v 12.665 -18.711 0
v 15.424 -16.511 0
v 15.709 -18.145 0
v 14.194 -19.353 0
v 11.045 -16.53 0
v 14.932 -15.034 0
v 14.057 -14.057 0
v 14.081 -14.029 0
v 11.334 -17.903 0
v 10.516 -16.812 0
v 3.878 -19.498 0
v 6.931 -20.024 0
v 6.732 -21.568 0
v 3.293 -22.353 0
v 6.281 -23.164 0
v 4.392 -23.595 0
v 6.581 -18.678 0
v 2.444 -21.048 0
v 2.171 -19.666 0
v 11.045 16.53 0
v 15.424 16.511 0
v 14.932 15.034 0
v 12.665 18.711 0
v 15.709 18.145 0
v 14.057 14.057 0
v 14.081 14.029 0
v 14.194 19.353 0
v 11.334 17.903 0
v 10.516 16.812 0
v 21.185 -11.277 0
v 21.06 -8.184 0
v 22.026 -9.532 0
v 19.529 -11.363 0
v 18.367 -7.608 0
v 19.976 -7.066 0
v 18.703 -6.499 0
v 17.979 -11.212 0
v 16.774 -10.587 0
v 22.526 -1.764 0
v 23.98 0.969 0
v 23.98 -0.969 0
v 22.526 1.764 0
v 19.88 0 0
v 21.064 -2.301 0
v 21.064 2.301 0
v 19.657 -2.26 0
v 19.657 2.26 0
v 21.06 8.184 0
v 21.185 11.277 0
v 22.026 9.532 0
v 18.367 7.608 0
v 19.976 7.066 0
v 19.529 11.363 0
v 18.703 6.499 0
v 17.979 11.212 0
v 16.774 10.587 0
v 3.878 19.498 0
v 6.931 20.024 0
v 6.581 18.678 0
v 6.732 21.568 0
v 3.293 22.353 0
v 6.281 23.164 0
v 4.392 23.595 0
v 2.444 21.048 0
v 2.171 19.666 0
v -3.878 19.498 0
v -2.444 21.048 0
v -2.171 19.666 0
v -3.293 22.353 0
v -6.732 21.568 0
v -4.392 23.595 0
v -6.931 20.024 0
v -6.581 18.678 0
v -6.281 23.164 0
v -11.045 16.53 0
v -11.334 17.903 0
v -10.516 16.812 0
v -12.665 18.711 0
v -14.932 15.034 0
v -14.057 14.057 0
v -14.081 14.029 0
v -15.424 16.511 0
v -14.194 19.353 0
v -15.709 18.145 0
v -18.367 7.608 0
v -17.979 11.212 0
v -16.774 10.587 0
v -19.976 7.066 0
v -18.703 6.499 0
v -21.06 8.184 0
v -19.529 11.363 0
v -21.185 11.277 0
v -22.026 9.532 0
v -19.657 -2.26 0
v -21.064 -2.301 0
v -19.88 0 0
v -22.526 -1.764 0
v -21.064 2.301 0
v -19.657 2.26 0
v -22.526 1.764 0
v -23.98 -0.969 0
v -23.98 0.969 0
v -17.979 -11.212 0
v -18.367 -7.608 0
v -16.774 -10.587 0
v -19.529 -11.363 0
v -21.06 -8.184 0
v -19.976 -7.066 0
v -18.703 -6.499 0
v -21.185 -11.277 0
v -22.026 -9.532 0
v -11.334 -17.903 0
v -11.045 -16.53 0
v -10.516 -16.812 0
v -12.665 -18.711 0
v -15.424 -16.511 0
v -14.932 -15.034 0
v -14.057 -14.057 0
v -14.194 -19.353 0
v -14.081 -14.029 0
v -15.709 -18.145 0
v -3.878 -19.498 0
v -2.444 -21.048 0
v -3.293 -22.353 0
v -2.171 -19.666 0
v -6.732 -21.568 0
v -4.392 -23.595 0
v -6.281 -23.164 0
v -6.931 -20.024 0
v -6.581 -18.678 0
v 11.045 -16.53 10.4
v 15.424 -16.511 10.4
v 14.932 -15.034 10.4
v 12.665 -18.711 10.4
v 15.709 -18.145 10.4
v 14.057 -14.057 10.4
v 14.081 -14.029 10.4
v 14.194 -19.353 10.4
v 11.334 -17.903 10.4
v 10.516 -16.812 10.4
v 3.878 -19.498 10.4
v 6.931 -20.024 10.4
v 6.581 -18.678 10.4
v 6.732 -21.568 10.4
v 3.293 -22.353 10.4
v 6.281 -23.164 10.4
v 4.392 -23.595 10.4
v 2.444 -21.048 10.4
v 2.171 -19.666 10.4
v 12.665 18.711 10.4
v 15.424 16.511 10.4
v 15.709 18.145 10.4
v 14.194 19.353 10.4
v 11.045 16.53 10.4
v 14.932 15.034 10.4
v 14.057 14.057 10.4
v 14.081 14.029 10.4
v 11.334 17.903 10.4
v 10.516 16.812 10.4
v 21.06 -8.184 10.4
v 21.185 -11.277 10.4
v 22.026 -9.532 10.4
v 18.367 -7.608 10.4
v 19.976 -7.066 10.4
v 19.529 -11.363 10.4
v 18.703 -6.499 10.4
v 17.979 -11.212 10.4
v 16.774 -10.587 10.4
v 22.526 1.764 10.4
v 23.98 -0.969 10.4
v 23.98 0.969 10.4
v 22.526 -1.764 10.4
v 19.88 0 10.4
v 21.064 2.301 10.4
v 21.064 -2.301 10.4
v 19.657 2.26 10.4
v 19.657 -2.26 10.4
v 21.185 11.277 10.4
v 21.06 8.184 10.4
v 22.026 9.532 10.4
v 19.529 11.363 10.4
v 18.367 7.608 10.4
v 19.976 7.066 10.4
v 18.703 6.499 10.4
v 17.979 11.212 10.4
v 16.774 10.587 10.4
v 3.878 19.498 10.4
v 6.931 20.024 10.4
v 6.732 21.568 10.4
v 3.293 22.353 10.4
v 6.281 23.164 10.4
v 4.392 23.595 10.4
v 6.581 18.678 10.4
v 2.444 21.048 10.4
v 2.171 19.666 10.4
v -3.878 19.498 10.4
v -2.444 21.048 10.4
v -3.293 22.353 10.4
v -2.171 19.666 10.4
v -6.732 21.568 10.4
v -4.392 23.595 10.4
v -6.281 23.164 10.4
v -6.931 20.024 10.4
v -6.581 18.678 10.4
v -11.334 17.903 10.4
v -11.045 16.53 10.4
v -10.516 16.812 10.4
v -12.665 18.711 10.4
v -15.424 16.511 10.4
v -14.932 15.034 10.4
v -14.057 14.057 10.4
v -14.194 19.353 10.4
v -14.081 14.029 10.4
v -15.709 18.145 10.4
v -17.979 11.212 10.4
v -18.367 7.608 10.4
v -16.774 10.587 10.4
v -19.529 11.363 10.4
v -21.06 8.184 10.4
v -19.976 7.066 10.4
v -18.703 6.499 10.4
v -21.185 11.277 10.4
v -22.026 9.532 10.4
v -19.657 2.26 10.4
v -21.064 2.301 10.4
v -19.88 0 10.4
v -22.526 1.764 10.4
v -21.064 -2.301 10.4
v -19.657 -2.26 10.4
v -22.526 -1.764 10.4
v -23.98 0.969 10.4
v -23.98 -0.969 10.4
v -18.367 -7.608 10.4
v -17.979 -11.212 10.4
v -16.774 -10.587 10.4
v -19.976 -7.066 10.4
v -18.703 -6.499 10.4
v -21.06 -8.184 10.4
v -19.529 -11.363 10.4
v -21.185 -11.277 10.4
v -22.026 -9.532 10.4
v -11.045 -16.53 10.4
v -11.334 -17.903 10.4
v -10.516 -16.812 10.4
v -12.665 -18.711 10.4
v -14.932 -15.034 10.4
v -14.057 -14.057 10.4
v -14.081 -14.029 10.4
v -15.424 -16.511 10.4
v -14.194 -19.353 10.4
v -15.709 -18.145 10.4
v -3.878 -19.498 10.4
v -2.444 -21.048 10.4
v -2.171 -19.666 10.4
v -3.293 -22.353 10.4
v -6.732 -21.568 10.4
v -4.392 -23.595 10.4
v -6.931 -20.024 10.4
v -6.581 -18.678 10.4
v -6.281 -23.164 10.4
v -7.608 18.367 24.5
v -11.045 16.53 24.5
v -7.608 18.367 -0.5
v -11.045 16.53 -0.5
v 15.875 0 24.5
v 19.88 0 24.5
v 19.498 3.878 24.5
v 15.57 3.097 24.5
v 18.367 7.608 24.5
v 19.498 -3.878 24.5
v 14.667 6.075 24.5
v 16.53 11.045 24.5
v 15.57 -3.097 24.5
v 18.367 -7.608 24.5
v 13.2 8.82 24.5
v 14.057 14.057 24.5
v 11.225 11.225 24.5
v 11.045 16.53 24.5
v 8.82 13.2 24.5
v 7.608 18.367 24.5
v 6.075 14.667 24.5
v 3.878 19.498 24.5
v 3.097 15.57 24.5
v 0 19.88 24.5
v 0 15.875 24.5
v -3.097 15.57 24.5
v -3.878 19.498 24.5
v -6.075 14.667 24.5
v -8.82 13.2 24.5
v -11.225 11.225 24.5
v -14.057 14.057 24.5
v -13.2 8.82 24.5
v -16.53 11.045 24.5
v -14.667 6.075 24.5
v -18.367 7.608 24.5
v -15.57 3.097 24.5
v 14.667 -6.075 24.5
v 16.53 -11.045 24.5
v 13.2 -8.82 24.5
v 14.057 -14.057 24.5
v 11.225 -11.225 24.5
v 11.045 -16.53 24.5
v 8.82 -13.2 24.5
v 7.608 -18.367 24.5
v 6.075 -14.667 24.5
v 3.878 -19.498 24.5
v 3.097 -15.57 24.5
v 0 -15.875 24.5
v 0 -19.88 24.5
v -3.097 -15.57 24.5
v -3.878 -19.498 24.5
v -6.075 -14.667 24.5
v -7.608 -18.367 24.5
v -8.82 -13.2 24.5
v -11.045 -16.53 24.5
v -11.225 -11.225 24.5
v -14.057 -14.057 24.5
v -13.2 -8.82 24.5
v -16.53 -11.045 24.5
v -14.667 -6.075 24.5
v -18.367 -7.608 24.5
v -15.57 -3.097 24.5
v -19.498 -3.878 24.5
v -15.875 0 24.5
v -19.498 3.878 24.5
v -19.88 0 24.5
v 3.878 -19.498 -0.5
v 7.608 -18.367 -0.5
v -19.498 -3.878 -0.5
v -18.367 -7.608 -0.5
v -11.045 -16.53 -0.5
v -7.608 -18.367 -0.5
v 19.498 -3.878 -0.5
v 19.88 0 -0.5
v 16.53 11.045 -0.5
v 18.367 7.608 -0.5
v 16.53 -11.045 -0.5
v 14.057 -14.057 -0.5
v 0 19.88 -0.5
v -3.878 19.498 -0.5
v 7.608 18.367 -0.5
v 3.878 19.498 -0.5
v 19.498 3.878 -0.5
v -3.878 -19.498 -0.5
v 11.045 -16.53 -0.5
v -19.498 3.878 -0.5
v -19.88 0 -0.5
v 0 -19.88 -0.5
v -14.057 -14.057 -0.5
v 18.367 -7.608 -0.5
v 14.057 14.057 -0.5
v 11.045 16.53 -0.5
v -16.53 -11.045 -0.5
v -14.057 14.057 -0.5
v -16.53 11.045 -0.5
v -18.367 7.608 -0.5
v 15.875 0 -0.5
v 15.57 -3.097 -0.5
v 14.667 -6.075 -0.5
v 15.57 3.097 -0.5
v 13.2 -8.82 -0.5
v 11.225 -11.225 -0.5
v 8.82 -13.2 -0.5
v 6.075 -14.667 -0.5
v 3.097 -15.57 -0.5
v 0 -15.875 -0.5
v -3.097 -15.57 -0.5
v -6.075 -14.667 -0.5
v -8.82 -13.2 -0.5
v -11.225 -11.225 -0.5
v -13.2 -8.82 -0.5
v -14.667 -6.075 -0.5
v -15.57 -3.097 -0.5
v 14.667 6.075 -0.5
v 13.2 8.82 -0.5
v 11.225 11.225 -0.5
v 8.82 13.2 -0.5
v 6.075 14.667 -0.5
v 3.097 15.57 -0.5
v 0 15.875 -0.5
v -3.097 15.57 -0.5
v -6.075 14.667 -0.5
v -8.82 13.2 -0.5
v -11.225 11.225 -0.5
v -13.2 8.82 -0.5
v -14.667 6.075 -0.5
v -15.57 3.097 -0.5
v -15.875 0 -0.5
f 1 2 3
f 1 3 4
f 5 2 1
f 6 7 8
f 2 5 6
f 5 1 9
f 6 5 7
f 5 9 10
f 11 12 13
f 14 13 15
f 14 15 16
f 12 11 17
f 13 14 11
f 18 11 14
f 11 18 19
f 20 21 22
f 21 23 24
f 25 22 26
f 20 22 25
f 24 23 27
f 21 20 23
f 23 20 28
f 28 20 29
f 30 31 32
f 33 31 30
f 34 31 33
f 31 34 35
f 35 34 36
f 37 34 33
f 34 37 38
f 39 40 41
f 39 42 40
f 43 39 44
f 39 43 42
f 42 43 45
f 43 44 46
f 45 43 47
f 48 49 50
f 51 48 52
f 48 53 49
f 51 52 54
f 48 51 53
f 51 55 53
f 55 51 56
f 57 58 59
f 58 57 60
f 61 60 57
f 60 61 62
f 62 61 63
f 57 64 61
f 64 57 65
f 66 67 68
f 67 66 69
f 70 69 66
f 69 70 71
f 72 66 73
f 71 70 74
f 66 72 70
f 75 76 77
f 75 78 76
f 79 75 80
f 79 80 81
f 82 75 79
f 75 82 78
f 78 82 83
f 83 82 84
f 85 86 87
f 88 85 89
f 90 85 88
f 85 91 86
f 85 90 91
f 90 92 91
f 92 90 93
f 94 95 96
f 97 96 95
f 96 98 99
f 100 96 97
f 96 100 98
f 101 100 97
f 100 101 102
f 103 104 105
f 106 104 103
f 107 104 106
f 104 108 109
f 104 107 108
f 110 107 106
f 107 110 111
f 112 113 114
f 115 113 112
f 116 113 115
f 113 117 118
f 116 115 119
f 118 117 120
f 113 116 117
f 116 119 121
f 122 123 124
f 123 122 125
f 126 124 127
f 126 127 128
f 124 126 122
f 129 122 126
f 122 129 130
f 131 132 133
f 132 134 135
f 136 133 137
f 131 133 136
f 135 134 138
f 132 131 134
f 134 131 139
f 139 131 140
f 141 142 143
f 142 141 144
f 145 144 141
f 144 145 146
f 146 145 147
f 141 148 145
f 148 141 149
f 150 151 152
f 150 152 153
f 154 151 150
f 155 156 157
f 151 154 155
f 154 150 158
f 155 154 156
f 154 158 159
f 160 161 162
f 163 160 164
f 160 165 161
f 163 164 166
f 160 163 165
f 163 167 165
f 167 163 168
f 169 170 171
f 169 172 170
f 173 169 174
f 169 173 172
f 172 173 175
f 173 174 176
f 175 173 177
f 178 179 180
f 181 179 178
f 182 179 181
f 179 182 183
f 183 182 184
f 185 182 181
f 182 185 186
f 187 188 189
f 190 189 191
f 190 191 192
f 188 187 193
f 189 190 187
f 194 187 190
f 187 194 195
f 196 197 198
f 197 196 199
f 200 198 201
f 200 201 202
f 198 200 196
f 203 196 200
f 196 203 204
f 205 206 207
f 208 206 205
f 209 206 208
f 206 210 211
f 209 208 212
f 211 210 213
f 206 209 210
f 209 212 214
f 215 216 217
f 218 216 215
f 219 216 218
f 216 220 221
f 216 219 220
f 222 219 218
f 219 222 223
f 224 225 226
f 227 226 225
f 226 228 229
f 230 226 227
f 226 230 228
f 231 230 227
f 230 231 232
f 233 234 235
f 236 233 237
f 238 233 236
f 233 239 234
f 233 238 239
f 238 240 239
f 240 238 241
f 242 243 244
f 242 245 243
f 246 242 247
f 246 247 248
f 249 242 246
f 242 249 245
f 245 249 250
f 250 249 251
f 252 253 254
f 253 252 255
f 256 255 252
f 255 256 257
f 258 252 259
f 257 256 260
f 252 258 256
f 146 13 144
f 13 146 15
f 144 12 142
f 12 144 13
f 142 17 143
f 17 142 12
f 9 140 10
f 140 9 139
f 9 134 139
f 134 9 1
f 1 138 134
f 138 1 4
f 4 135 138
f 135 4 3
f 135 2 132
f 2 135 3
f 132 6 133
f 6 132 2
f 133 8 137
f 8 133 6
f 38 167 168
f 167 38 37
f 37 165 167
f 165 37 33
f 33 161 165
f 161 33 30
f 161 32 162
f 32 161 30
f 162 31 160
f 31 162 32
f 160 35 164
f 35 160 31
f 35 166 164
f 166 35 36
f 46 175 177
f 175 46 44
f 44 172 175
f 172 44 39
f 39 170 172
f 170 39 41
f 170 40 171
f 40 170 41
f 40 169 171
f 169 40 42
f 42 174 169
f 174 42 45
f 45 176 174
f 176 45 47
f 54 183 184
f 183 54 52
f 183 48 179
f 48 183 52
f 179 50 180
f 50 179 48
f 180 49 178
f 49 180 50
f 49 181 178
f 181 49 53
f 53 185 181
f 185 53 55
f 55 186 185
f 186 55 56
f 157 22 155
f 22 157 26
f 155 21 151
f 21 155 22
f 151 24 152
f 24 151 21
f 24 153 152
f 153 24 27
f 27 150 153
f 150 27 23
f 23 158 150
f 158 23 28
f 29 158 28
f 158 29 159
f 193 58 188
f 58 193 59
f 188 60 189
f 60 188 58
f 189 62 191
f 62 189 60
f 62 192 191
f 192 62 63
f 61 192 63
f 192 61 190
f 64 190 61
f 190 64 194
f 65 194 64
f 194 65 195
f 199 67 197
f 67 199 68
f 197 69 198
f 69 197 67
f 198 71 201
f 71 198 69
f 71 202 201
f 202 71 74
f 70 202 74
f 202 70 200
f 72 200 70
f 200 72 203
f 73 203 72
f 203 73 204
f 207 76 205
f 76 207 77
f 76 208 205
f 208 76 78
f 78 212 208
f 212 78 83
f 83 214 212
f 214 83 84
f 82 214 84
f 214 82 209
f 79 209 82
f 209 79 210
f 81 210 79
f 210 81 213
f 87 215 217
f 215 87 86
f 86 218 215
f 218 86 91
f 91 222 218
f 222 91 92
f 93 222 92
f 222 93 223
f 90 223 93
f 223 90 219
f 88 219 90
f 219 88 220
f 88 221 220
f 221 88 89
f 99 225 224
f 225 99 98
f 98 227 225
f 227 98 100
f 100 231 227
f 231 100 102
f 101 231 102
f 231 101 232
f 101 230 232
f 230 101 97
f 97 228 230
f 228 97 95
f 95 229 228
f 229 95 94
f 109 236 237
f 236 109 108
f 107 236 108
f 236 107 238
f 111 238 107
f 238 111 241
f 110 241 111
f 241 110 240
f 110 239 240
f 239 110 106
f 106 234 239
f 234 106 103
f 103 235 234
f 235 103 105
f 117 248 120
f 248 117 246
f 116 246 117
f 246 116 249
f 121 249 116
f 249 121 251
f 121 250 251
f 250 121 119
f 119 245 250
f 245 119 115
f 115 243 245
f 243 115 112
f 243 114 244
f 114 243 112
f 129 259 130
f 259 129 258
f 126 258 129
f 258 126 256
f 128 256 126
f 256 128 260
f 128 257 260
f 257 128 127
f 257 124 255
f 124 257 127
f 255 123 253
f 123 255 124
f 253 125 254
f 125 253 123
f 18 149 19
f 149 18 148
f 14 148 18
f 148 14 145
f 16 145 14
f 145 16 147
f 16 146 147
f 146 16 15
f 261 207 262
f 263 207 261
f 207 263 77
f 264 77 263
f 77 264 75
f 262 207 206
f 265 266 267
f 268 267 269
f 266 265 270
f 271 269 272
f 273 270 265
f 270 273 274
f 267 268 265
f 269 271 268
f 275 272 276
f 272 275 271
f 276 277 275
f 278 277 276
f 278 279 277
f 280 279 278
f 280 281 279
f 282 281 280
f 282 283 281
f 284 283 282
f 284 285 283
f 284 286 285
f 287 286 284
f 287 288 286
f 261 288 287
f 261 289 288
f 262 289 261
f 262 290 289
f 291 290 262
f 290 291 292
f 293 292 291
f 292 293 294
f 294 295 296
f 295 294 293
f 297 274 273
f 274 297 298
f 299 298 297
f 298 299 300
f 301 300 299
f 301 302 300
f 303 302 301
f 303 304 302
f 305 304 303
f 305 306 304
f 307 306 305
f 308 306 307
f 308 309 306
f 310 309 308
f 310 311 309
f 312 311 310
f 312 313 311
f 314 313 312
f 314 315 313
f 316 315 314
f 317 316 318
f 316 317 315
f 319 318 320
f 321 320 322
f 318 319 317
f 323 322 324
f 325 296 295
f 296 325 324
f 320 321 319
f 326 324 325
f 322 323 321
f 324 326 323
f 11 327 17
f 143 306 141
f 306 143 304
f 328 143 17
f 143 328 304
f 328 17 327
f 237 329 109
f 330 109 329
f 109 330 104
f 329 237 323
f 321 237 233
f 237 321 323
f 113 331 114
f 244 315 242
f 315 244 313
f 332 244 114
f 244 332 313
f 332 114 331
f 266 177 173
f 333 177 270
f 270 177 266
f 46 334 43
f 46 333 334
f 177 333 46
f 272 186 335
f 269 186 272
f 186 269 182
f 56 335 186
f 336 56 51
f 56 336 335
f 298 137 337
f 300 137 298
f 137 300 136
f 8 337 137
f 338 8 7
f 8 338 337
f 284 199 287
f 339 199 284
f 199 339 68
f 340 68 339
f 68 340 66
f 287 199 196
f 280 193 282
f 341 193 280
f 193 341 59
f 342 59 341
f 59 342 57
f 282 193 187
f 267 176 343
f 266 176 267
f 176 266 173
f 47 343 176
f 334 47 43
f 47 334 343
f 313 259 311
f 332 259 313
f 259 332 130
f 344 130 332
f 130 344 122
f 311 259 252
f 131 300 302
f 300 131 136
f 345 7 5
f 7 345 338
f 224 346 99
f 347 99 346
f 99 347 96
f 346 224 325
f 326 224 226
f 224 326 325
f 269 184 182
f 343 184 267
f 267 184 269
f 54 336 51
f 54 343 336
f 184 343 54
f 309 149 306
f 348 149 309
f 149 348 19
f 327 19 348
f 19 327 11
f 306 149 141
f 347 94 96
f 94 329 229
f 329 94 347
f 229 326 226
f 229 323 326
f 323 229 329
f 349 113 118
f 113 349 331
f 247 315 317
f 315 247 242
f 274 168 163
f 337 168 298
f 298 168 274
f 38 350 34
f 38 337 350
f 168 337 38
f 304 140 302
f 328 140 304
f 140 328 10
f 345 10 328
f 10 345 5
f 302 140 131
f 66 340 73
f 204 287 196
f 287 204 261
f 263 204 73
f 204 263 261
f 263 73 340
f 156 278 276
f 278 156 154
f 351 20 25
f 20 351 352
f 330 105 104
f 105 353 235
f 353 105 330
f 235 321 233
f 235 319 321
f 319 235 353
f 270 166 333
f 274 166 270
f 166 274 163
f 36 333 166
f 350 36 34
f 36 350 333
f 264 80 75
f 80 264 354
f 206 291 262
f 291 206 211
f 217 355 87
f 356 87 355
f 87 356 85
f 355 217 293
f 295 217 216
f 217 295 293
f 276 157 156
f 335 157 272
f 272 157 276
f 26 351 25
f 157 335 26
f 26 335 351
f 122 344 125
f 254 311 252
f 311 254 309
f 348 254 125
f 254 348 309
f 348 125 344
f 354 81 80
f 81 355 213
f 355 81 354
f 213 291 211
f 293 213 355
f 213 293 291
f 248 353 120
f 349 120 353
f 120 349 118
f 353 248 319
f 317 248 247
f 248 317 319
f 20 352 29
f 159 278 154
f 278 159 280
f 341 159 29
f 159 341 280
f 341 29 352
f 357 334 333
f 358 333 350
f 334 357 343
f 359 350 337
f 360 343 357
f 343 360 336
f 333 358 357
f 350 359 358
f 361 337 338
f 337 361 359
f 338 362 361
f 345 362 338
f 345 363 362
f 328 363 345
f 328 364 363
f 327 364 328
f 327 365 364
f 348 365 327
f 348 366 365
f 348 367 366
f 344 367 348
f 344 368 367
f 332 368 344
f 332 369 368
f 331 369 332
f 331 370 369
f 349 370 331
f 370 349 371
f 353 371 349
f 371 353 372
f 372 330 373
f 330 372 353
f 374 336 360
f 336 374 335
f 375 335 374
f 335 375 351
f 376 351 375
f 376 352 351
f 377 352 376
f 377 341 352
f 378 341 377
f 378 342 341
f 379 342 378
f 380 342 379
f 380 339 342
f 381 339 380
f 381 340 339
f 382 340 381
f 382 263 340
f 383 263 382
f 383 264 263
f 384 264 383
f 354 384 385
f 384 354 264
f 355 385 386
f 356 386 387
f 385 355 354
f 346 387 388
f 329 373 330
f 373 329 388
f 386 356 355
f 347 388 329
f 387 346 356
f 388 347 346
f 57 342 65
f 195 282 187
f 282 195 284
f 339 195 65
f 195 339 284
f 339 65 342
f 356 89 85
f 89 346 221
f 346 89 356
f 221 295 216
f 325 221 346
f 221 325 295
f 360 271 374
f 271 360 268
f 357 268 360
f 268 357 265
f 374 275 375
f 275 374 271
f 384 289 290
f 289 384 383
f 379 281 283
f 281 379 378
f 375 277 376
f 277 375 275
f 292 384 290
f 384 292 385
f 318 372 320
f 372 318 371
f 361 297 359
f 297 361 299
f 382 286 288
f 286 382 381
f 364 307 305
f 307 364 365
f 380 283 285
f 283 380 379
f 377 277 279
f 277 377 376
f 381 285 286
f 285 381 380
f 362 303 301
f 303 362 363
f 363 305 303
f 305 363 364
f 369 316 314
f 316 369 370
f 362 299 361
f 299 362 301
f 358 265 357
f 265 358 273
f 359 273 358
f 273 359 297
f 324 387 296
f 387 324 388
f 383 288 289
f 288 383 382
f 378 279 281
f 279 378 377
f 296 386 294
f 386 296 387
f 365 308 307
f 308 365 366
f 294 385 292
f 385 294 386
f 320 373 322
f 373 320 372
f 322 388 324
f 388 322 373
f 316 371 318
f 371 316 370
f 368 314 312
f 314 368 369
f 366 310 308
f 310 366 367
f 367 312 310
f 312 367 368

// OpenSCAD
$fn = 32;

// ----------------------------------------------------------------------
// Two-module gear rim: z14 m3 and z18 m1.8, 24 mm wide
// ----------------------------------------------------------------------

// --- parameters (mm) ---
module_a = 3;             // first tooth module
teeth_a = 14;             // first band tooth count
module_b = 1.8;           // second tooth module
teeth_b = 18;             // second band tooth count
band_h = 10;              // height of one tooth band
web_t = 4;                // web thickness between the bands
total = 24;               // overall width over both bands
root_r = 17.25;           // root radius of the coarse band
hub_r = 19.88;            // hub radius
bore_d = 31.75;           // hub bore
hole_count = 5;           // lightening holes
hole_r = 13.12;           // lightening hole circle radius
hole_d = 4;               // lightening hole diameter

band_a = [[17.111, -2.185], [21.064, -2.301], [22.526, -1.764], [23.98, -0.969], [23.98, 0.969], [22.526, 1.764], [21.064, 2.301], [17.111, 2.185], [16.364, 5.456], [19.976, 7.066], [21.06, 8.184], [22.026, 9.532], [21.185, 11.277], [19.529, 11.363], [17.979, 11.212], [14.469, 9.392], [12.377, 12.016], [14.932, 15.034], [15.424, 16.511], [15.709, 18.145], [14.194, 19.353], [12.665, 18.711], [11.334, 17.903], [8.961, 14.74], [5.937, 16.196], [6.931, 20.024], [6.732, 21.568], [6.281, 23.164], [4.392, 23.595], [3.293, 22.353], [2.444, 21.048], [1.678, 17.168], [-1.678, 17.168], [-2.444, 21.048], [-3.293, 22.353], [-4.392, 23.595], [-6.281, 23.164], [-6.732, 21.568], [-6.931, 20.024], [-5.937, 16.196], [-8.961, 14.74], [-11.334, 17.903], [-12.665, 18.711], [-14.194, 19.353], [-15.709, 18.145], [-15.424, 16.511], [-14.932, 15.034], [-12.377, 12.016], [-14.469, 9.392], [-17.979, 11.212], [-19.529, 11.363], [-21.185, 11.277], [-22.026, 9.532], [-21.06, 8.184], [-19.976, 7.066], [-16.364, 5.456], [-17.111, 2.185], [-21.064, 2.301], [-22.526, 1.764], [-23.98, 0.969], [-23.98, -0.969], [-22.526, -1.764], [-21.064, -2.301], [-17.111, -2.185], [-16.364, -5.456], [-19.976, -7.066], [-21.06, -8.184], [-22.026, -9.532], [-21.185, -11.277], [-19.529, -11.363], [-17.979, -11.212], [-14.469, -9.392], [-12.377, -12.016], [-14.932, -15.034], [-15.424, -16.511], [-15.709, -18.145], [-14.194, -19.353], [-12.665, -18.711], [-11.334, -17.903], [-8.961, -14.74], [-5.937, -16.196], [-6.931, -20.024], [-6.732, -21.568], [-6.281, -23.164], [-4.392, -23.595], [-3.293, -22.353], [-2.444, -21.048], [-1.678, -17.168], [1.678, -17.168], [2.444, -21.048], [3.293, -22.353], [4.392, -23.595], [6.281, -23.164], [6.732, -21.568], [6.931, -20.024], [5.937, -16.196], [8.961, -14.74], [11.334, -17.903], [12.665, -18.711], [14.194, -19.353], [15.709, -18.145], [15.424, -16.511], [14.932, -15.034], [12.377, -12.016], [14.469, -9.392], [17.979, -11.212], [19.529, -11.363], [21.185, -11.277], [22.026, -9.532], [21.06, -8.184], [19.976, -7.066], [16.364, -5.456]];
band_b = [[13.878, -1.42], [16.12, -1.417], [17.056, -1.088], [17.99, -0.613], [17.99, 0.613], [17.056, 1.088], [16.12, 1.417], [13.878, 1.42], [13.526, 3.412], [15.632, 4.182], [16.4, 4.811], [17.114, 5.576], [16.695, 6.729], [15.656, 6.856], [14.663, 6.845], [12.555, 6.081], [11.544, 7.832], [13.259, 9.276], [13.765, 10.13], [14.175, 11.094], [13.387, 12.033], [12.366, 11.797], [11.438, 11.447], [9.718, 10.008], [8.169, 11.308], [9.287, 13.252], [9.471, 14.227], [9.526, 15.273], [8.464, 15.886], [7.586, 15.315], [6.833, 14.669], [5.709, 12.728], [3.809, 13.42], [4.195, 15.629], [4.033, 16.608], [3.728, 17.61], [2.52, 17.823], [1.89, 16.986], [1.404, 16.121], [1.011, 13.913], [-1.011, 13.913], [-1.404, 16.121], [-1.89, 16.986], [-2.52, 17.823], [-3.728, 17.61], [-4.033, 16.608], [-4.195, 15.629], [-3.809, 13.42], [-5.709, 12.728], [-6.833, 14.669], [-7.586, 15.315], [-8.464, 15.886], [-9.526, 15.273], [-9.471, 14.227], [-9.287, 13.252], [-8.169, 11.308], [-9.718, 10.008], [-11.438, 11.447], [-12.366, 11.797], [-13.387, 12.033], [-14.175, 11.094], [-13.765, 10.13], [-13.259, 9.276], [-11.544, 7.832], [-12.555, 6.081], [-14.663, 6.845], [-15.656, 6.856], [-16.695, 6.729], [-17.114, 5.576], [-16.4, 4.811], [-15.632, 4.182], [-13.526, 3.412], [-13.878, 1.42], [-16.12, 1.417], [-17.056, 1.088], [-17.99, 0.613], [-17.99, -0.613], [-17.056, -1.088], [-16.12, -1.417], [-13.878, -1.42], [-13.526, -3.412], [-15.632, -4.182], [-16.4, -4.811], [-17.114, -5.576], [-16.695, -6.729], [-15.656, -6.856], [-14.663, -6.845], [-12.555, -6.081], [-11.544, -7.832], [-13.259, -9.276], [-13.765, -10.13], [-14.175, -11.094], [-13.387, -12.033], [-12.366, -11.797], [-11.438, -11.447], [-9.718, -10.008], [-8.169, -11.308], [-9.287, -13.252], [-9.471, -14.227], [-9.526, -15.273], [-8.464, -15.886], [-7.586, -15.315], [-6.833, -14.669], [-5.709, -12.728], [-3.809, -13.42], [-4.195, -15.629], [-4.033, -16.608], [-3.728, -17.61], [-2.52, -17.823], [-1.89, -16.986], [-1.404, -16.121], [-1.011, -13.913], [1.011, -13.913], [1.404, -16.121], [1.89, -16.986], [2.52, -17.823], [3.728, -17.61], [4.033, -16.608], [4.195, -15.629], [3.809, -13.42], [5.709, -12.728], [6.833, -14.669], [7.586, -15.315], [8.464, -15.886], [9.526, -15.273], [9.471, -14.227], [9.287, -13.252], [8.169, -11.308], [9.718, -10.008], [11.438, -11.447], [12.366, -11.797], [13.387, -12.033], [14.175, -11.094], [13.765, -10.13], [13.259, -9.276], [11.544, -7.832], [12.555, -6.081], [14.663, -6.845], [15.656, -6.856], [16.695, -6.729], [17.114, -5.576], [16.4, -4.811], [15.632, -4.182], [13.526, -3.412]];

difference() {
  union() {
    /* tooth band A, overlapping the web by 0.4 mm */
    linear_extrude(height = band_h + 0.4) polygon(band_a);
    /* web */
    translate([0, 0, band_h - 0.4]) cylinder(h = web_t + 0.8, d = 2 * root_r);
    /* tooth band B */
    translate([0, 0, band_h + web_t]) linear_extrude(height = band_h + 0.4) polygon(band_b);
    /* hub */
    translate([0, 0, -0.5]) cylinder(h = total + 1.0, d = 2 * hub_r);
  }
  /* bore */
  translate([0, 0, -2.5]) cylinder(h = total + 5, d = bore_d);
  /* lightening holes through the web */
  for (i = [0 : hole_count - 1]) {
    a = i * 360 / hole_count;
    translate([hole_r * cos(a), hole_r * sin(a), -2.5]) cylinder(h = total + 5, d = hole_d);
  }
}
